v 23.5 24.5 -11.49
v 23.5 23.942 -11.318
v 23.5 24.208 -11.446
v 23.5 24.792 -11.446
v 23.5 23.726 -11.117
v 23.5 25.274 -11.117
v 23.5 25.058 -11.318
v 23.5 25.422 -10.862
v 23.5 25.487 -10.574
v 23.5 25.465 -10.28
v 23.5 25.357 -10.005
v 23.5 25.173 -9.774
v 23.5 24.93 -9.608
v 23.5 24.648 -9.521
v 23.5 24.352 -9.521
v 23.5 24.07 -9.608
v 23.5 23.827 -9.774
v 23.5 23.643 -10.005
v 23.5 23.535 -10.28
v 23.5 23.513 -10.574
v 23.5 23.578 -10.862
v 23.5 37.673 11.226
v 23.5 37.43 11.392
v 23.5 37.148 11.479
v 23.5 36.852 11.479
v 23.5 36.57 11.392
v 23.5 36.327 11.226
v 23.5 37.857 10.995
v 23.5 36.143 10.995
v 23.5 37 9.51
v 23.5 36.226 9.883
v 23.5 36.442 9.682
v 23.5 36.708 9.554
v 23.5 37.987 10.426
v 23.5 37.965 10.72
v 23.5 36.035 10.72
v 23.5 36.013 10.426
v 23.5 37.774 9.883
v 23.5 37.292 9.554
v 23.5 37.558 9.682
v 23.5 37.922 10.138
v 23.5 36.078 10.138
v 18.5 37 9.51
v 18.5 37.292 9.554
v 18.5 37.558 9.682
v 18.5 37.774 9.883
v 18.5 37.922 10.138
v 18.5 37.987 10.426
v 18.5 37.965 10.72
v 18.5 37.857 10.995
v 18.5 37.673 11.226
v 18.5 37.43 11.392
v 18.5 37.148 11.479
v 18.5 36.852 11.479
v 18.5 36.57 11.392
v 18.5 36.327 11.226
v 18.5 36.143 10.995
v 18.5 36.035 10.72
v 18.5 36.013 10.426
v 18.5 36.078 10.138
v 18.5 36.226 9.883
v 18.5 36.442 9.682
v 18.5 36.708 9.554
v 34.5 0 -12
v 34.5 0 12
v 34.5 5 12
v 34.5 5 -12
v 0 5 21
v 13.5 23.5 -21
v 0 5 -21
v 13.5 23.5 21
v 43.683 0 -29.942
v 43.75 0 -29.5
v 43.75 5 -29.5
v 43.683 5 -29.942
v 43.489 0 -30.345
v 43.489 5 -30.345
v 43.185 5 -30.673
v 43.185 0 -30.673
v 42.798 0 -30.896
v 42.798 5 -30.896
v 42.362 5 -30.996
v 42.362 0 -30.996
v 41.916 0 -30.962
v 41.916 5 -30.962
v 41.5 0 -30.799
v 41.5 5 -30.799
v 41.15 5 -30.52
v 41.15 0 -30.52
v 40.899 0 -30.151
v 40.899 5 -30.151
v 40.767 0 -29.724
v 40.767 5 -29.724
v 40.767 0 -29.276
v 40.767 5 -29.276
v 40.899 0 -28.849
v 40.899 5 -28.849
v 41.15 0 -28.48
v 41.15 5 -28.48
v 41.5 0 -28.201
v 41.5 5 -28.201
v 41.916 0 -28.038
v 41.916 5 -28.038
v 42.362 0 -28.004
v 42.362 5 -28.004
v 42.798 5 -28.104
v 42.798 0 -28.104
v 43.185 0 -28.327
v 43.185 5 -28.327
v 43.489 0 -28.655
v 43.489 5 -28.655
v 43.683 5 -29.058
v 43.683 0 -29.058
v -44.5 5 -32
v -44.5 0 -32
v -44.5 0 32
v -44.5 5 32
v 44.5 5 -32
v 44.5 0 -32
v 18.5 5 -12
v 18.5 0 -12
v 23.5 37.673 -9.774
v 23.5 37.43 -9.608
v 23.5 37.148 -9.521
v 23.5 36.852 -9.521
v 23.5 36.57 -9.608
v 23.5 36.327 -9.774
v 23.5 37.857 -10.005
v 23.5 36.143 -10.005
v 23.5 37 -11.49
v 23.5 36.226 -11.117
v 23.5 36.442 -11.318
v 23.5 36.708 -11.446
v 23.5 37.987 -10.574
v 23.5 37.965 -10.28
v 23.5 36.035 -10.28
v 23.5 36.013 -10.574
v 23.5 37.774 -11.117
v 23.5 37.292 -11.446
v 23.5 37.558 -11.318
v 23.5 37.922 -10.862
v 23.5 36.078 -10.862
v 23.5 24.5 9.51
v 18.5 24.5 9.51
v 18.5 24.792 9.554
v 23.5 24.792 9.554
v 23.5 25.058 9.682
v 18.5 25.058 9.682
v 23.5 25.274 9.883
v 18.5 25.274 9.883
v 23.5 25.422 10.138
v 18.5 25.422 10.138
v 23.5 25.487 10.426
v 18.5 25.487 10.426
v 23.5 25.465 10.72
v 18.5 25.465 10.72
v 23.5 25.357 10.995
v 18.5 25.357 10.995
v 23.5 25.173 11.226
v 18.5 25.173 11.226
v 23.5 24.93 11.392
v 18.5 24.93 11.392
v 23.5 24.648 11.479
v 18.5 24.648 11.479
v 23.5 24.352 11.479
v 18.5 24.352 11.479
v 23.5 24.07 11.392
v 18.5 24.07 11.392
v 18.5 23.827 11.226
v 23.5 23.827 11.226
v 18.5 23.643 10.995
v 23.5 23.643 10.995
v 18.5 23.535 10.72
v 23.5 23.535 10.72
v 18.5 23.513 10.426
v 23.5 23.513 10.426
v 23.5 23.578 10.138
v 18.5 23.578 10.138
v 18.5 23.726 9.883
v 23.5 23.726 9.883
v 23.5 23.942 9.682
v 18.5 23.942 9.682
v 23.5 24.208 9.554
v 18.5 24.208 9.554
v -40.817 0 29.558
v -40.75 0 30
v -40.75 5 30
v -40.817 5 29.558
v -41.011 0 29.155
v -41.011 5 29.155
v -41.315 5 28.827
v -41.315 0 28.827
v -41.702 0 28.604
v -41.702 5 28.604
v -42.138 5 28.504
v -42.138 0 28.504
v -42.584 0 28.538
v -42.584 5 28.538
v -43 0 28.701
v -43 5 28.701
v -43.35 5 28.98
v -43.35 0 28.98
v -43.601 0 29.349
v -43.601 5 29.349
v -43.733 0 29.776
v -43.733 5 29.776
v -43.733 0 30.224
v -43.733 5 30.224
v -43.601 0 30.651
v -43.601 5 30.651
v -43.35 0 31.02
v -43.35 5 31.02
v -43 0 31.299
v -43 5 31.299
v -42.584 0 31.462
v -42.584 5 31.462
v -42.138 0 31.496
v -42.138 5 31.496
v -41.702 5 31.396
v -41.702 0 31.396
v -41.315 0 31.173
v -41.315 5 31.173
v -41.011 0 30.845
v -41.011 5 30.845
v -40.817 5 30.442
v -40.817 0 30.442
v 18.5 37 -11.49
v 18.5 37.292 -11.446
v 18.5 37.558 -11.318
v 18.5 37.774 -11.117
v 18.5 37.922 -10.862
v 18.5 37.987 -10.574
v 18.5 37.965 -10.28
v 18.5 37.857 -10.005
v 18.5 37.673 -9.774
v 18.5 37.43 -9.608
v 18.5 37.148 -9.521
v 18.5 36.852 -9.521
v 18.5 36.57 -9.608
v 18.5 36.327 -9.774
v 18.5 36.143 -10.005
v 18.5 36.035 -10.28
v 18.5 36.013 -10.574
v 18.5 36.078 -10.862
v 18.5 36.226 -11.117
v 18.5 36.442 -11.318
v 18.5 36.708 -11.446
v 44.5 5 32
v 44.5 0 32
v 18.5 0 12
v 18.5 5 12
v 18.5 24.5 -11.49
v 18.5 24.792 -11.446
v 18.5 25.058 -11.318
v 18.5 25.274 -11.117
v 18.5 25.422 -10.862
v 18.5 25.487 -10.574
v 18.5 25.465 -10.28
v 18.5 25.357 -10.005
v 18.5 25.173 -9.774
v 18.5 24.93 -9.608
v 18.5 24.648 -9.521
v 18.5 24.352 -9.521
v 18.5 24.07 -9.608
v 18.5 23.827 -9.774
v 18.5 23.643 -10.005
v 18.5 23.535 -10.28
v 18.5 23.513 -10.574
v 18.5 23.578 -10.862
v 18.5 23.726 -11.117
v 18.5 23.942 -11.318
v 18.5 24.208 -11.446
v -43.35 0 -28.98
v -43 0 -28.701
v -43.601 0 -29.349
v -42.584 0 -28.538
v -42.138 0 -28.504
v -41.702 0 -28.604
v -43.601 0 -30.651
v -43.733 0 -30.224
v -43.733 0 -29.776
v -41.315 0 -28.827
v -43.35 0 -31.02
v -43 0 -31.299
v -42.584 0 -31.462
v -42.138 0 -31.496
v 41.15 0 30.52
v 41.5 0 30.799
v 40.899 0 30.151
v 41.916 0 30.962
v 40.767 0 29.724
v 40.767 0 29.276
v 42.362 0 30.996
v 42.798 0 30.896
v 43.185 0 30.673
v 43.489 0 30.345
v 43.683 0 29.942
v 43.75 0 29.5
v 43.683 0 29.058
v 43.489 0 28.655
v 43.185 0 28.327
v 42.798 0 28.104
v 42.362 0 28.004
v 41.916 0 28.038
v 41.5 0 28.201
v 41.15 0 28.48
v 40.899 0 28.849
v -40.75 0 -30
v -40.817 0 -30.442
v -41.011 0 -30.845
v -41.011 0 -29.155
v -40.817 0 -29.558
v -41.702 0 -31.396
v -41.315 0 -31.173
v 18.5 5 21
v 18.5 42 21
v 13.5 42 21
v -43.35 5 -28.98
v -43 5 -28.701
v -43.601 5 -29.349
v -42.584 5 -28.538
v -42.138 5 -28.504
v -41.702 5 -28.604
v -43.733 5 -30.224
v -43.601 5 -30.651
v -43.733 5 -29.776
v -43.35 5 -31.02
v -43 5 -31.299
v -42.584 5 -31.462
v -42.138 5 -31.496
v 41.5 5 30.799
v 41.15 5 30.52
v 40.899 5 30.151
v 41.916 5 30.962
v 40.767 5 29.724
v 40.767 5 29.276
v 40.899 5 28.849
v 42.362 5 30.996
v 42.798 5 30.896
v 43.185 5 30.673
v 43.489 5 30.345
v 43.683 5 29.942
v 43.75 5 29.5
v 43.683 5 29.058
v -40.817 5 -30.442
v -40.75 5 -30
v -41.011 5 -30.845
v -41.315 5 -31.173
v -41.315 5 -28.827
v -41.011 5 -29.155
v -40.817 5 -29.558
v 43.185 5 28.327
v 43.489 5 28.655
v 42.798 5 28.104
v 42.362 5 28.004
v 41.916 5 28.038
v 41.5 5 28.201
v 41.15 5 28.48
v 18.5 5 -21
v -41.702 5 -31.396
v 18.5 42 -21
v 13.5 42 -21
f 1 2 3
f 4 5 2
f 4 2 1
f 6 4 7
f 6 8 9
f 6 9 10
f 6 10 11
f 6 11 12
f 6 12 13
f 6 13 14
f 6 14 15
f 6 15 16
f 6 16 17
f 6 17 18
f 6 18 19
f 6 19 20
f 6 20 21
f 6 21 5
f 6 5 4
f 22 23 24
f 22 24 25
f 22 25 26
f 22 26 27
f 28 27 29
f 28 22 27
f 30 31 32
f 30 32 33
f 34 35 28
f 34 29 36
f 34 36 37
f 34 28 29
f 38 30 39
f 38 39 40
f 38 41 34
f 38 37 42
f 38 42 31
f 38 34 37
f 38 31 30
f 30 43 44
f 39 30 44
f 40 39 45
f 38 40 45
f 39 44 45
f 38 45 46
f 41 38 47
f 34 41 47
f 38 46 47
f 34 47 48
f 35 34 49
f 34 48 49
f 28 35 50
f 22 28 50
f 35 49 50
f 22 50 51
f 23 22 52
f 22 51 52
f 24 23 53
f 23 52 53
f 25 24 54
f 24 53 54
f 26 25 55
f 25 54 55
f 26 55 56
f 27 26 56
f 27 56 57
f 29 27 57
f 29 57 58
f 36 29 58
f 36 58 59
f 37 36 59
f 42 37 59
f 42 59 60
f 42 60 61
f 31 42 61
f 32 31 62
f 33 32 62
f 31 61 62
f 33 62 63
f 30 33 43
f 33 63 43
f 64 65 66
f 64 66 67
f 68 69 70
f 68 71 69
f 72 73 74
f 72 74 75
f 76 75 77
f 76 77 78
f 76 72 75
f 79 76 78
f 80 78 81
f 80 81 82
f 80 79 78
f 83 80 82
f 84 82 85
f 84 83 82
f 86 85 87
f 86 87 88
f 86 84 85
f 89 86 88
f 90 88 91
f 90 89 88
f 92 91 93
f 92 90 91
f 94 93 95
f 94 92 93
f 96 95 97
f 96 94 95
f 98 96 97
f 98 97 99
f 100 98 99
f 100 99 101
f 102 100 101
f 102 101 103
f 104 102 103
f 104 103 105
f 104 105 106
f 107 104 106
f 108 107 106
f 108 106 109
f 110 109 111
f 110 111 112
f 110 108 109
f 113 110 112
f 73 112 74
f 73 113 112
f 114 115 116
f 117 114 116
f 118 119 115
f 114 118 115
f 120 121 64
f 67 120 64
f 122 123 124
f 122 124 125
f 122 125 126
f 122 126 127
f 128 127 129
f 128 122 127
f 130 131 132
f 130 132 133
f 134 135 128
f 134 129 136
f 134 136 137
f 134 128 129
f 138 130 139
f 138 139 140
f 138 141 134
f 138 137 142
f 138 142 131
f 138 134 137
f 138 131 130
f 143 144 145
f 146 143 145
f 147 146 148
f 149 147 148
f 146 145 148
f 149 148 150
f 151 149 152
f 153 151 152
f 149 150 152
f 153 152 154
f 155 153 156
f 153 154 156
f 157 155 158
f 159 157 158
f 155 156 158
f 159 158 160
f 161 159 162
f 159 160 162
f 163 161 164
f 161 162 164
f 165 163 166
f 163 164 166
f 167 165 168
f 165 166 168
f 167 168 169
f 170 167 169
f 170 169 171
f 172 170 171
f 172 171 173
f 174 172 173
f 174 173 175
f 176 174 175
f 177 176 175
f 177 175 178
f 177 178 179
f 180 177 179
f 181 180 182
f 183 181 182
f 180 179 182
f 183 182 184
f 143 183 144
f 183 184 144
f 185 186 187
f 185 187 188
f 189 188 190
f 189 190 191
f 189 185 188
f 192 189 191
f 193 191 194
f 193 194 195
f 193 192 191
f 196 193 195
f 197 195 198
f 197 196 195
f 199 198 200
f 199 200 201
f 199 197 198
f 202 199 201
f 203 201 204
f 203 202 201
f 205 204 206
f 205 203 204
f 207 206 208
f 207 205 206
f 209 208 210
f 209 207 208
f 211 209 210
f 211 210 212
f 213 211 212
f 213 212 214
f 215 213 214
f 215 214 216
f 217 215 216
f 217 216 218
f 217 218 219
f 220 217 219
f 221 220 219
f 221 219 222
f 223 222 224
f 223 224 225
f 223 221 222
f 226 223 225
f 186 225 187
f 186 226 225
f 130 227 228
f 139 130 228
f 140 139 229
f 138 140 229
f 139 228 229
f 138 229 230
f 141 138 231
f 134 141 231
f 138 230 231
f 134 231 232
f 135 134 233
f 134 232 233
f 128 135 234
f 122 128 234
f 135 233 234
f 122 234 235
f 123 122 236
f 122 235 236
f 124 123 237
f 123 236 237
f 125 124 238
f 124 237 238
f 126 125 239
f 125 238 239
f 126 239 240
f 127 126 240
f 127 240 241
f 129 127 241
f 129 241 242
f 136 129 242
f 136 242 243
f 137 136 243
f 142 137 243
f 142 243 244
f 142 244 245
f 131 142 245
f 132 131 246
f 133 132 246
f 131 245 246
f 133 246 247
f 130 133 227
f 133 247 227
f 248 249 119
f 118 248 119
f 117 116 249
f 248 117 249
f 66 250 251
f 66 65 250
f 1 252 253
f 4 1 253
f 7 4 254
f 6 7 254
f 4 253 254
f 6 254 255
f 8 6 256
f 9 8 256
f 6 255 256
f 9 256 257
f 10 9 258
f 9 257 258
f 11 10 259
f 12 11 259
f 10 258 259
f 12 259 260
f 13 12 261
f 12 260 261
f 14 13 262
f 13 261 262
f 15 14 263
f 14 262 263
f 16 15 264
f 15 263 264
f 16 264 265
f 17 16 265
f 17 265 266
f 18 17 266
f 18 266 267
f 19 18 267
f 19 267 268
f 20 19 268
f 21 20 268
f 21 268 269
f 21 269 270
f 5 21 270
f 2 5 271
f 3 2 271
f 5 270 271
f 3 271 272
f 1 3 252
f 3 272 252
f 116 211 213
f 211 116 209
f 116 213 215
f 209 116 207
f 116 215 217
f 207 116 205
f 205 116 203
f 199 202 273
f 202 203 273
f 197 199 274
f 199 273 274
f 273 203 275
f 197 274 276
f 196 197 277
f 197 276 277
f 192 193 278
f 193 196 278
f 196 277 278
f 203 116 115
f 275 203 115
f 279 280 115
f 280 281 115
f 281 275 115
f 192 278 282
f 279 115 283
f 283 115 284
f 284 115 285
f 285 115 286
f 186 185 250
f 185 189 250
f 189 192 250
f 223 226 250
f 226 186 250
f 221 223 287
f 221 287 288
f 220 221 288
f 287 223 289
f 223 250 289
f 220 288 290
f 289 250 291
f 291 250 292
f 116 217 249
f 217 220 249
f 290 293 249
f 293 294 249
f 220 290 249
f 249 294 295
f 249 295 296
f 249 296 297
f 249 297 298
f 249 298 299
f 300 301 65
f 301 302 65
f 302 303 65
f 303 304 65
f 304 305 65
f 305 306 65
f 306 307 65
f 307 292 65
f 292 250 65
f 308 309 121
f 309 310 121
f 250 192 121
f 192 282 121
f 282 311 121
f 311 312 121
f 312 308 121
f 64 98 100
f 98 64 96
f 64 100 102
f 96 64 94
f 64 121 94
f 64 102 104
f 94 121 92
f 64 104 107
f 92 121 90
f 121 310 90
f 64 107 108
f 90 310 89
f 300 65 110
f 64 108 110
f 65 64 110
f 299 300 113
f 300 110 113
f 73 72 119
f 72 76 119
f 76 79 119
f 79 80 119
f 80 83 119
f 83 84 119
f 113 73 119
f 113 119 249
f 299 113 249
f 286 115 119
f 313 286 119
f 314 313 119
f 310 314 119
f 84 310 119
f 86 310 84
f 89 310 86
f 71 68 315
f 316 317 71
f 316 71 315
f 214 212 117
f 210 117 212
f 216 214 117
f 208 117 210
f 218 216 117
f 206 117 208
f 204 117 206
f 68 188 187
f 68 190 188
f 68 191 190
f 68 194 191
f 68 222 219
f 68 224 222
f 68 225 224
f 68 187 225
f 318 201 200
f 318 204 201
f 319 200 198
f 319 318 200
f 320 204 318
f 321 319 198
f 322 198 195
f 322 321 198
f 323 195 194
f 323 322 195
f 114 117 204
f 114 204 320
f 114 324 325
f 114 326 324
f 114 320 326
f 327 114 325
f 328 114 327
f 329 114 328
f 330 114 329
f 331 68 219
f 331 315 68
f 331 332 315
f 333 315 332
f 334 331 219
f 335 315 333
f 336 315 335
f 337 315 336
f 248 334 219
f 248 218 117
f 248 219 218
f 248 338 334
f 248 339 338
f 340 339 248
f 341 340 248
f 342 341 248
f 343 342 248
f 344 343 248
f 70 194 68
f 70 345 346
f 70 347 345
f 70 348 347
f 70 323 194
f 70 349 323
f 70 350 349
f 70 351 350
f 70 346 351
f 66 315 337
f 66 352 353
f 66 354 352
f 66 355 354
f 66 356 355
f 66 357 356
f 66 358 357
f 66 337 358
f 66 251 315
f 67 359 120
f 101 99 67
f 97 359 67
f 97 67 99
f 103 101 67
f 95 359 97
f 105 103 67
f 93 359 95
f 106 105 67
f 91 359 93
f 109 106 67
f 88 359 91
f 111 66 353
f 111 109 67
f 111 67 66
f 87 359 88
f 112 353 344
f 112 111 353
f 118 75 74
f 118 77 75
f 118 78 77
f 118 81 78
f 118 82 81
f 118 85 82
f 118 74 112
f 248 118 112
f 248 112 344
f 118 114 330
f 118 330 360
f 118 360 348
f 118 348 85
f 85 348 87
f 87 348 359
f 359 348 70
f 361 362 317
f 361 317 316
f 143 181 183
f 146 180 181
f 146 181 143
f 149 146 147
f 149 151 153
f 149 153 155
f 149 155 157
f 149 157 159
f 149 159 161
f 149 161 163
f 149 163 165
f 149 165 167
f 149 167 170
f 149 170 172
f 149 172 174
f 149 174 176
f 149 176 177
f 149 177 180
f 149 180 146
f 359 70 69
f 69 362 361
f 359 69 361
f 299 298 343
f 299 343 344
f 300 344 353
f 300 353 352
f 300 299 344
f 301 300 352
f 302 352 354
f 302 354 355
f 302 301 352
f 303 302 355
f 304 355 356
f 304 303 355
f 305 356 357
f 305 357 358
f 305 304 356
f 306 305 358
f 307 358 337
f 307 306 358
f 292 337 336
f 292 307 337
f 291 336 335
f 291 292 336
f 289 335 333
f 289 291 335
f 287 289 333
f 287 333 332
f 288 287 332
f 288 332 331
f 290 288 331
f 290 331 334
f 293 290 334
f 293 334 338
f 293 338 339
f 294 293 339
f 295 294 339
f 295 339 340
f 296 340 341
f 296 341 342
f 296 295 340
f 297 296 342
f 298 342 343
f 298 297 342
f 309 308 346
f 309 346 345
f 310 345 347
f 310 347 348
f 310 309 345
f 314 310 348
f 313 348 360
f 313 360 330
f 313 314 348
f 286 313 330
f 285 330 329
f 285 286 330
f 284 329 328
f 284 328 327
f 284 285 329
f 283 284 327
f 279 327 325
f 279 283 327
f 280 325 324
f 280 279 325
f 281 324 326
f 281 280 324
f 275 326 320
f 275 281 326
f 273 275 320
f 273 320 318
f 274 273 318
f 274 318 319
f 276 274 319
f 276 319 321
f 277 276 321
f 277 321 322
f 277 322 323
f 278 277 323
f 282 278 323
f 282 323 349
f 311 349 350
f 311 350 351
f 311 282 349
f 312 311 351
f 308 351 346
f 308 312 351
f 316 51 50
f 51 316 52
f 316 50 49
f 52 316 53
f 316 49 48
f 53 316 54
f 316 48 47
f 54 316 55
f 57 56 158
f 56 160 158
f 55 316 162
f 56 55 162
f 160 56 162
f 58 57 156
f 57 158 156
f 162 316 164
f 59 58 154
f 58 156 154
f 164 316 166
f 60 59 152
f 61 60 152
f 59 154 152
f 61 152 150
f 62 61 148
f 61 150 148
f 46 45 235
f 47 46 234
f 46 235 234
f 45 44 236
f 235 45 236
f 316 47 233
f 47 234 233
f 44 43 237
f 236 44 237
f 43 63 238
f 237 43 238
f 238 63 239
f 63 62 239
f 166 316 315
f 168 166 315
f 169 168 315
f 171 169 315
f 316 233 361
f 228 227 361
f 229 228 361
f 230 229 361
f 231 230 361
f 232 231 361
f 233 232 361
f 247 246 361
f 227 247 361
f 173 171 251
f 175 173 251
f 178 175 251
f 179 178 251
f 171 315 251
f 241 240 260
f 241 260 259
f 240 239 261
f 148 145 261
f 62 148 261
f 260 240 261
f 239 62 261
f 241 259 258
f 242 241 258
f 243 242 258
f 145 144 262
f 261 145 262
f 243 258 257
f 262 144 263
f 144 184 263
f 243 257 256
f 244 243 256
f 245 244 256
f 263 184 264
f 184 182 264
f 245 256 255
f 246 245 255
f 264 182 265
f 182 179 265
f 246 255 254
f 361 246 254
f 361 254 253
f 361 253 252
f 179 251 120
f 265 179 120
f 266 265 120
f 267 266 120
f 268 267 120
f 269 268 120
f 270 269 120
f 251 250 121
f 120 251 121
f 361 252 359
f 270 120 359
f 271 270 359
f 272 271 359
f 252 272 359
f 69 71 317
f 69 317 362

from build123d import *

# Parameters (mm, degrees)
SKETCH1_R           = 1.5
BOSS_EXTRUDE1_DEPTH = 5
SKETCH1_3_W         = 10
SKETCH1_3_H         = 24
CUT_EXTRUDE1_DEPTH  = 6
SKETCH1_4_W         = 5
SKETCH1_4_H         = 42
BOSS_EXTRUDE2_DEPTH = 42
BOSS_EXTRUDE3_DEPTH = 21
SKETCH4_W           = 24
SKETCH4_H           = 5
CUT_EXTRUDE2_DEPTH  = 6
SKETCH5_R           = 0.99
BOSS_EXTRUDE4_DEPTH = 5


with BuildPart() as part:
    # Sketch1 → Boss-Extrude1 (new body)
    with BuildSketch(Plane(origin=(0, 0, 0), x_dir=(1, 0, 0), z_dir=(0, 1, 0))):
        Polygon((-44.5, -32), (44.5, -32), (44.5, -12), (44.5, 12), (44.5, 32), (-44.5, 32), align=None)
        with Locations((-42.25, -30)):
            Circle(SKETCH1_R, mode=Mode.SUBTRACT)
        with Locations((42.25, -29.5)):
            Circle(SKETCH1_R, mode=Mode.SUBTRACT)
        with Locations((-42.25, 30)):
            Circle(SKETCH1_R, mode=Mode.SUBTRACT)
        with Locations((42.25, 29.5)):
            Circle(SKETCH1_R, mode=Mode.SUBTRACT)
    extrude(amount=BOSS_EXTRUDE1_DEPTH)

    # Sketch1<3> → Cut-Extrude1 (cut, through all)
    with BuildSketch(Plane(origin=(0, 0, 0), x_dir=(1, 0, 0), z_dir=(0, 1, 0))):
        with Locations((29.5, 0)):
            Rectangle(SKETCH1_3_W, SKETCH1_3_H)
    extrude(amount=CUT_EXTRUDE1_DEPTH, mode=Mode.SUBTRACT)

    # Sketch1<4> → Boss-Extrude2 (add)
    with BuildSketch(Plane(origin=(0, 0, 0), x_dir=(1, 0, 0), z_dir=(0, 1, 0))):
        with Locations((16, 0)):
            Rectangle(SKETCH1_4_W, SKETCH1_4_H)
    extrude(amount=BOSS_EXTRUDE2_DEPTH)

    # Sketch3 → Boss-Extrude3 (add, symmetric)
    with BuildSketch(Plane.XY):
        Polygon((13.5, 23.5), (0, 5), (13.5, 5), align=None)
    extrude(amount=BOSS_EXTRUDE3_DEPTH, both=True)

    # Sketch4 → Cut-Extrude2 (cut)
    with BuildSketch(Plane(origin=(24.5, 0, 0), x_dir=(0, 0, -1), z_dir=(1, 0, 0))):
        with Locations((0, 2.5)):
            Rectangle(SKETCH4_W, SKETCH4_H)
    extrude(amount=-CUT_EXTRUDE2_DEPTH, mode=Mode.SUBTRACT)

    # Sketch5 → Boss-Extrude4 (add)
    with BuildSketch(Plane(origin=(18.5, 0, 0), x_dir=(0, 0, -1), z_dir=(1, 0, 0))):
        with Locations((-10.5, 37)):
            Circle(SKETCH5_R)
        with Locations((10.5, 37)):
            Circle(SKETCH5_R)
        with Locations((10.5, 24.5)):
            Circle(SKETCH5_R)
        with Locations((-10.5, 24.5)):
            Circle(SKETCH5_R)
    extrude(amount=BOSS_EXTRUDE4_DEPTH)


solid = part.part
